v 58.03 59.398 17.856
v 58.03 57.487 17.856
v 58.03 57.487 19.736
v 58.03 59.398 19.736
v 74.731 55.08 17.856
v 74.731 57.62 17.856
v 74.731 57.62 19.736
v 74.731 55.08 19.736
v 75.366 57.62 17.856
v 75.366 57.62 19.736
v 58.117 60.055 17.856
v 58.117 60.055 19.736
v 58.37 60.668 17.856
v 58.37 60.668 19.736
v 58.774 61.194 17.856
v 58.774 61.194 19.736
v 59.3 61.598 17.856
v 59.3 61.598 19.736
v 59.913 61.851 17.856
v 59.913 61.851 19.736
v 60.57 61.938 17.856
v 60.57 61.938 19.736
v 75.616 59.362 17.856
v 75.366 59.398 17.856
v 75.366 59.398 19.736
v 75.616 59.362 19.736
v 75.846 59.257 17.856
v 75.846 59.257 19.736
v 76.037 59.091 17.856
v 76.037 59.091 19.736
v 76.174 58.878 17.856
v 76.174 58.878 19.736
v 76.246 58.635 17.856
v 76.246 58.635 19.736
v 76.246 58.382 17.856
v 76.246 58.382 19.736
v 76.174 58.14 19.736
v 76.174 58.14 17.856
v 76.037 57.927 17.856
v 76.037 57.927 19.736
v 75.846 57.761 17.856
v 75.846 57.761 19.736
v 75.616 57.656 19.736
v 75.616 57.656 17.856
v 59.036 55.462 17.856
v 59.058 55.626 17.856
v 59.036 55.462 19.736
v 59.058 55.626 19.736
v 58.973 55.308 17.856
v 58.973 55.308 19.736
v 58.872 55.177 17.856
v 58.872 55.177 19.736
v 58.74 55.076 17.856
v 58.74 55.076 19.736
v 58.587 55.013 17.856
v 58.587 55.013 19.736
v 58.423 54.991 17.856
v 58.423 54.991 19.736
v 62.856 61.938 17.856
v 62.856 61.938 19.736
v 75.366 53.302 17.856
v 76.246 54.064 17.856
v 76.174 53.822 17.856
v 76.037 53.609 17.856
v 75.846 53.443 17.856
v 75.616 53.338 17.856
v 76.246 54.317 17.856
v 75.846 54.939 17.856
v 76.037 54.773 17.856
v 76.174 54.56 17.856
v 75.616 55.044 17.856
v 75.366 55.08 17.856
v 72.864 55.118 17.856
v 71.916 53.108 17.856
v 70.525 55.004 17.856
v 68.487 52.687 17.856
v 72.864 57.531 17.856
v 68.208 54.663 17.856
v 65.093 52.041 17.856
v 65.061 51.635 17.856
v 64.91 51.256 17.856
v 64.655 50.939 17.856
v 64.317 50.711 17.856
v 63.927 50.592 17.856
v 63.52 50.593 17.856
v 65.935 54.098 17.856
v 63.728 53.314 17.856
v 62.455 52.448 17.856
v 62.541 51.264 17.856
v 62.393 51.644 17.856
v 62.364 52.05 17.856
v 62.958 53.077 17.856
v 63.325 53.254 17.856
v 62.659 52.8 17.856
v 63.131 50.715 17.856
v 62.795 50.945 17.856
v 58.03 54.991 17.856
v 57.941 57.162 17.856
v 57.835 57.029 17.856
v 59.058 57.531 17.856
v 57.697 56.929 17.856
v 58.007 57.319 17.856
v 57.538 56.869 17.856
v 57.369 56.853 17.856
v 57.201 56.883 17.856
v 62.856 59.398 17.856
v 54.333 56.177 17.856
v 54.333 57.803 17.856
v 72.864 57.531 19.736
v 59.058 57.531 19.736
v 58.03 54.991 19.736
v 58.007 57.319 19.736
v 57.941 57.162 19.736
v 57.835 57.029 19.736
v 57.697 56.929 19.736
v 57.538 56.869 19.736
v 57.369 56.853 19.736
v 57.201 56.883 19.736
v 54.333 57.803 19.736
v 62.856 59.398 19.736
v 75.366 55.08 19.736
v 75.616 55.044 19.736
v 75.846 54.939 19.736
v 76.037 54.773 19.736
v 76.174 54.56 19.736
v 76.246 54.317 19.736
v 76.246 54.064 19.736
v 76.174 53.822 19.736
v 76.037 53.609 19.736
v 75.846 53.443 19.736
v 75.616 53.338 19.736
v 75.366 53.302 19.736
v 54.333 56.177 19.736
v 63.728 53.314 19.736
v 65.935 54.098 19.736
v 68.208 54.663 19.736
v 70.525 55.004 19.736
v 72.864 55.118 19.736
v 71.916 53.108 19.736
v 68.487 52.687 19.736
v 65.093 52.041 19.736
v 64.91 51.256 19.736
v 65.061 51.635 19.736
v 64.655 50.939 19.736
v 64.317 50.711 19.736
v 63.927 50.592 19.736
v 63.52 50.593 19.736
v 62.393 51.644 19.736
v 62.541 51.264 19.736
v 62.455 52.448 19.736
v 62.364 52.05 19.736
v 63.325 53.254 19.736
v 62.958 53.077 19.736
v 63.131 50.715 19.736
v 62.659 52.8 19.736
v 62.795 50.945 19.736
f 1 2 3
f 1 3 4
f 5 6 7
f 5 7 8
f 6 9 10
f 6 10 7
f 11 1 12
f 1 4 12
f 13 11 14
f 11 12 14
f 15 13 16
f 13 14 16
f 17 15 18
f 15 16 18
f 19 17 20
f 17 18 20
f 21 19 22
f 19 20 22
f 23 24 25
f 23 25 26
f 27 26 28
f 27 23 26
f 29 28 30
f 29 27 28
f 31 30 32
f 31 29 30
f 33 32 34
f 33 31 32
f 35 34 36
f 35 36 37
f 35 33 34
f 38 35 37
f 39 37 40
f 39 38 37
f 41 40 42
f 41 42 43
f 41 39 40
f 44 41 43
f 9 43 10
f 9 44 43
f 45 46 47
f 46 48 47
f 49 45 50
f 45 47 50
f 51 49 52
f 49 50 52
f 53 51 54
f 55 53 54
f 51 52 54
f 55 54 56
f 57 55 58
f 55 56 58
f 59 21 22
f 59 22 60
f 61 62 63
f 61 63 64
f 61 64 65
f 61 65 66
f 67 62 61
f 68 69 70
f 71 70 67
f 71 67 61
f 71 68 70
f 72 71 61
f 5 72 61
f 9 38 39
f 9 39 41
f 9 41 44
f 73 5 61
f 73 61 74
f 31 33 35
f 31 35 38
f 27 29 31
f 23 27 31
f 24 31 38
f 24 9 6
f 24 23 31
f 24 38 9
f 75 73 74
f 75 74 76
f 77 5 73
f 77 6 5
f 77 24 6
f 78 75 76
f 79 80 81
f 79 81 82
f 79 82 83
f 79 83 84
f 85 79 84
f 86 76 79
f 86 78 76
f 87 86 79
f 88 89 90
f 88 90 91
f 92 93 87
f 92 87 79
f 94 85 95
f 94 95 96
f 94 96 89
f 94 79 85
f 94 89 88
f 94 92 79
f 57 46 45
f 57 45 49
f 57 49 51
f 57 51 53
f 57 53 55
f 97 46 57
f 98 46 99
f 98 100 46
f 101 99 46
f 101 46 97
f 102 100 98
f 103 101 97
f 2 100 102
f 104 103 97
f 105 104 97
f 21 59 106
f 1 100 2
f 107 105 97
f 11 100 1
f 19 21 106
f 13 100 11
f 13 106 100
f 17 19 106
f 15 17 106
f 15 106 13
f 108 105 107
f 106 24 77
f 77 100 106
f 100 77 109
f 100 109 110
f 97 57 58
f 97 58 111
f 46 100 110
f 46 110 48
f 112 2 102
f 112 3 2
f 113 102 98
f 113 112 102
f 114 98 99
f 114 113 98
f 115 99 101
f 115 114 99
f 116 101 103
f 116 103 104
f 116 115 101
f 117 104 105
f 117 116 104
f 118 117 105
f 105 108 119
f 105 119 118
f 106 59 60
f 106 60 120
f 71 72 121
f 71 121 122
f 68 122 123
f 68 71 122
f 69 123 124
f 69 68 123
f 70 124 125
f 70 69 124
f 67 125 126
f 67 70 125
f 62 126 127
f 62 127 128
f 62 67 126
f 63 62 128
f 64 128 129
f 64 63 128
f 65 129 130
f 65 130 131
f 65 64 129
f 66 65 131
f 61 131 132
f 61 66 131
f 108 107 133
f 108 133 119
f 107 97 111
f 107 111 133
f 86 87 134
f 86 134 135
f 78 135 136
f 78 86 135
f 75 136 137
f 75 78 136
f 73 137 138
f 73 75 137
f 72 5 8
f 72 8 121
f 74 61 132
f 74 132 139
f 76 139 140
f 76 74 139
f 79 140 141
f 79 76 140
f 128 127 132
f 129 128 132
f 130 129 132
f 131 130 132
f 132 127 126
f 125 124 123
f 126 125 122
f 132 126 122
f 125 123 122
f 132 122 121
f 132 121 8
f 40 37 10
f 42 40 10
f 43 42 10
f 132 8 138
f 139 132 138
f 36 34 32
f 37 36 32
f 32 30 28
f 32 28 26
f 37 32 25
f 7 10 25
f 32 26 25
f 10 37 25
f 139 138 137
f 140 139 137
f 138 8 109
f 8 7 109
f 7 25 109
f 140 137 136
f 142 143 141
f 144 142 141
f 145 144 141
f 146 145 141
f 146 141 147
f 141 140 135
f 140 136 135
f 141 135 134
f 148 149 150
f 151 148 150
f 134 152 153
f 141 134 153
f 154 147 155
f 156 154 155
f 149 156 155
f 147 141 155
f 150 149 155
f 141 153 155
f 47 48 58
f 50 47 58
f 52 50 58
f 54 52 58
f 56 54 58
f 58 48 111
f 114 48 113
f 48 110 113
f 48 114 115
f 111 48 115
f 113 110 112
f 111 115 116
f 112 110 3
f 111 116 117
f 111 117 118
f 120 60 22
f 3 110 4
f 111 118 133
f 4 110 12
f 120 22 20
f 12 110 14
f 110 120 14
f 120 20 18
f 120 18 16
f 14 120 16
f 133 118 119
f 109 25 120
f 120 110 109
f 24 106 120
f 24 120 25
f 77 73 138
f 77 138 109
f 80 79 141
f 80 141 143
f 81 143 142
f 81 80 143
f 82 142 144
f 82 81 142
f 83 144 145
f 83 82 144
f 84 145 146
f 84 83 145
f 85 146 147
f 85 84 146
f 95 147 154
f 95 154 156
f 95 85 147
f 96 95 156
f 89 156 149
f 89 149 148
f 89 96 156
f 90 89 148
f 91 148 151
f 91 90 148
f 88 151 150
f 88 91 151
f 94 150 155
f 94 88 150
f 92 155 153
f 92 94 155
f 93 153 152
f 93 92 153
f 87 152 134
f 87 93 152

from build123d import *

# Parameters (mm, degrees)
BOSS_EXTRUDE1_DEPTH = 37.592
FILLET1_R           = 12.7
FILLET2_R           = 50.8
FILLET3_R           = 12.7
SCALE1_SCALE        = 0.05


with BuildPart() as part:
    # Sketch1 → Boss-Extrude1 (new body)
    with BuildSketch(Plane.XY):
        with BuildLine():
            Line((0, 109.420372667), (250.19, 109.420372667))
            ThreePointArc((250.19, 109.420372667), (267.97, 91.640372667), (250.19, 73.860372667))
            Line((250.19, 73.860372667), (237.49, 73.860372667))
            Line((237.49, 73.860372667), (237.49, 23.060372667))
            Line((237.49, 23.060372667), (250.19, 23.060372667))
            ThreePointArc((250.19, 23.060372667), (267.97, 5.280372667), (250.19, -12.499627333))
            ThreePointArc((250.19, -12.499627333), (146.843102498, -20.027410993), (44.744230284, -37.721168163))
            ThreePointArc((44.744230284, -37.721168163), (-1.227067533, -59.631780483), (17.441932467, -12.25136687))
            ThreePointArc((17.441932467, -12.25136687), (107.033415037, 14.717722357), (200.152, 23.822372667))
            Line((200.152, 23.822372667), (200.152, 72.082372667))
            Line((200.152, 72.082372667), (-75.968392762, 72.082372667))
            Line((-75.968392762, 72.082372667), (-75.968392762, 21.282372667))
            Line((-75.968392762, 21.282372667), (-96.52, 21.282372667))
            Line((-96.52, 21.282372667), (-170.457211488, 45.010876589))
            Line((-170.457211488, 45.010876589), (-170.457211488, 77.522876589))
            Line((-170.457211488, 77.522876589), (-96.52, 53.794372667))
            Line((-96.52, 53.794372667), (-96.52, 139.901603313))
            Line((-96.52, 139.901603313), (-96.52, 160.220372667))
            Line((-96.52, 160.220372667), (0, 160.220372667))
            Line((0, 160.220372667), (0, 109.420372667))
        make_face()
    extrude(amount=BOSS_EXTRUDE1_DEPTH)

    # Fillet1
    fillet1_edges = [part.edges().sort_by_distance(p)[0] for p in [
        (-75.968392762, 21.282372667, 18.796),
    ]]
    fillet(fillet1_edges, radius=FILLET1_R)

    # Fillet2
    fillet2_edges = [part.edges().sort_by_distance(p)[0] for p in [
        (-96.52, 160.220372667, 18.796),
    ]]
    fillet(fillet2_edges, radius=FILLET2_R)

    # Fillet3
    fillet3_edges = [part.edges().sort_by_distance(p)[0] for p in [
        (-96.52, 53.794372667, 18.796),
    ]]
    fillet(fillet3_edges, radius=FILLET3_R)


with BuildPart() as part_1:
    # Scale1: scaled about (66.164273322, 56.765113867, 18.796)
    add(part.part.scale(SCALE1_SCALE).moved(Location((62.856059656, 53.926858174, 17.8562))))


solid = part_1.part
